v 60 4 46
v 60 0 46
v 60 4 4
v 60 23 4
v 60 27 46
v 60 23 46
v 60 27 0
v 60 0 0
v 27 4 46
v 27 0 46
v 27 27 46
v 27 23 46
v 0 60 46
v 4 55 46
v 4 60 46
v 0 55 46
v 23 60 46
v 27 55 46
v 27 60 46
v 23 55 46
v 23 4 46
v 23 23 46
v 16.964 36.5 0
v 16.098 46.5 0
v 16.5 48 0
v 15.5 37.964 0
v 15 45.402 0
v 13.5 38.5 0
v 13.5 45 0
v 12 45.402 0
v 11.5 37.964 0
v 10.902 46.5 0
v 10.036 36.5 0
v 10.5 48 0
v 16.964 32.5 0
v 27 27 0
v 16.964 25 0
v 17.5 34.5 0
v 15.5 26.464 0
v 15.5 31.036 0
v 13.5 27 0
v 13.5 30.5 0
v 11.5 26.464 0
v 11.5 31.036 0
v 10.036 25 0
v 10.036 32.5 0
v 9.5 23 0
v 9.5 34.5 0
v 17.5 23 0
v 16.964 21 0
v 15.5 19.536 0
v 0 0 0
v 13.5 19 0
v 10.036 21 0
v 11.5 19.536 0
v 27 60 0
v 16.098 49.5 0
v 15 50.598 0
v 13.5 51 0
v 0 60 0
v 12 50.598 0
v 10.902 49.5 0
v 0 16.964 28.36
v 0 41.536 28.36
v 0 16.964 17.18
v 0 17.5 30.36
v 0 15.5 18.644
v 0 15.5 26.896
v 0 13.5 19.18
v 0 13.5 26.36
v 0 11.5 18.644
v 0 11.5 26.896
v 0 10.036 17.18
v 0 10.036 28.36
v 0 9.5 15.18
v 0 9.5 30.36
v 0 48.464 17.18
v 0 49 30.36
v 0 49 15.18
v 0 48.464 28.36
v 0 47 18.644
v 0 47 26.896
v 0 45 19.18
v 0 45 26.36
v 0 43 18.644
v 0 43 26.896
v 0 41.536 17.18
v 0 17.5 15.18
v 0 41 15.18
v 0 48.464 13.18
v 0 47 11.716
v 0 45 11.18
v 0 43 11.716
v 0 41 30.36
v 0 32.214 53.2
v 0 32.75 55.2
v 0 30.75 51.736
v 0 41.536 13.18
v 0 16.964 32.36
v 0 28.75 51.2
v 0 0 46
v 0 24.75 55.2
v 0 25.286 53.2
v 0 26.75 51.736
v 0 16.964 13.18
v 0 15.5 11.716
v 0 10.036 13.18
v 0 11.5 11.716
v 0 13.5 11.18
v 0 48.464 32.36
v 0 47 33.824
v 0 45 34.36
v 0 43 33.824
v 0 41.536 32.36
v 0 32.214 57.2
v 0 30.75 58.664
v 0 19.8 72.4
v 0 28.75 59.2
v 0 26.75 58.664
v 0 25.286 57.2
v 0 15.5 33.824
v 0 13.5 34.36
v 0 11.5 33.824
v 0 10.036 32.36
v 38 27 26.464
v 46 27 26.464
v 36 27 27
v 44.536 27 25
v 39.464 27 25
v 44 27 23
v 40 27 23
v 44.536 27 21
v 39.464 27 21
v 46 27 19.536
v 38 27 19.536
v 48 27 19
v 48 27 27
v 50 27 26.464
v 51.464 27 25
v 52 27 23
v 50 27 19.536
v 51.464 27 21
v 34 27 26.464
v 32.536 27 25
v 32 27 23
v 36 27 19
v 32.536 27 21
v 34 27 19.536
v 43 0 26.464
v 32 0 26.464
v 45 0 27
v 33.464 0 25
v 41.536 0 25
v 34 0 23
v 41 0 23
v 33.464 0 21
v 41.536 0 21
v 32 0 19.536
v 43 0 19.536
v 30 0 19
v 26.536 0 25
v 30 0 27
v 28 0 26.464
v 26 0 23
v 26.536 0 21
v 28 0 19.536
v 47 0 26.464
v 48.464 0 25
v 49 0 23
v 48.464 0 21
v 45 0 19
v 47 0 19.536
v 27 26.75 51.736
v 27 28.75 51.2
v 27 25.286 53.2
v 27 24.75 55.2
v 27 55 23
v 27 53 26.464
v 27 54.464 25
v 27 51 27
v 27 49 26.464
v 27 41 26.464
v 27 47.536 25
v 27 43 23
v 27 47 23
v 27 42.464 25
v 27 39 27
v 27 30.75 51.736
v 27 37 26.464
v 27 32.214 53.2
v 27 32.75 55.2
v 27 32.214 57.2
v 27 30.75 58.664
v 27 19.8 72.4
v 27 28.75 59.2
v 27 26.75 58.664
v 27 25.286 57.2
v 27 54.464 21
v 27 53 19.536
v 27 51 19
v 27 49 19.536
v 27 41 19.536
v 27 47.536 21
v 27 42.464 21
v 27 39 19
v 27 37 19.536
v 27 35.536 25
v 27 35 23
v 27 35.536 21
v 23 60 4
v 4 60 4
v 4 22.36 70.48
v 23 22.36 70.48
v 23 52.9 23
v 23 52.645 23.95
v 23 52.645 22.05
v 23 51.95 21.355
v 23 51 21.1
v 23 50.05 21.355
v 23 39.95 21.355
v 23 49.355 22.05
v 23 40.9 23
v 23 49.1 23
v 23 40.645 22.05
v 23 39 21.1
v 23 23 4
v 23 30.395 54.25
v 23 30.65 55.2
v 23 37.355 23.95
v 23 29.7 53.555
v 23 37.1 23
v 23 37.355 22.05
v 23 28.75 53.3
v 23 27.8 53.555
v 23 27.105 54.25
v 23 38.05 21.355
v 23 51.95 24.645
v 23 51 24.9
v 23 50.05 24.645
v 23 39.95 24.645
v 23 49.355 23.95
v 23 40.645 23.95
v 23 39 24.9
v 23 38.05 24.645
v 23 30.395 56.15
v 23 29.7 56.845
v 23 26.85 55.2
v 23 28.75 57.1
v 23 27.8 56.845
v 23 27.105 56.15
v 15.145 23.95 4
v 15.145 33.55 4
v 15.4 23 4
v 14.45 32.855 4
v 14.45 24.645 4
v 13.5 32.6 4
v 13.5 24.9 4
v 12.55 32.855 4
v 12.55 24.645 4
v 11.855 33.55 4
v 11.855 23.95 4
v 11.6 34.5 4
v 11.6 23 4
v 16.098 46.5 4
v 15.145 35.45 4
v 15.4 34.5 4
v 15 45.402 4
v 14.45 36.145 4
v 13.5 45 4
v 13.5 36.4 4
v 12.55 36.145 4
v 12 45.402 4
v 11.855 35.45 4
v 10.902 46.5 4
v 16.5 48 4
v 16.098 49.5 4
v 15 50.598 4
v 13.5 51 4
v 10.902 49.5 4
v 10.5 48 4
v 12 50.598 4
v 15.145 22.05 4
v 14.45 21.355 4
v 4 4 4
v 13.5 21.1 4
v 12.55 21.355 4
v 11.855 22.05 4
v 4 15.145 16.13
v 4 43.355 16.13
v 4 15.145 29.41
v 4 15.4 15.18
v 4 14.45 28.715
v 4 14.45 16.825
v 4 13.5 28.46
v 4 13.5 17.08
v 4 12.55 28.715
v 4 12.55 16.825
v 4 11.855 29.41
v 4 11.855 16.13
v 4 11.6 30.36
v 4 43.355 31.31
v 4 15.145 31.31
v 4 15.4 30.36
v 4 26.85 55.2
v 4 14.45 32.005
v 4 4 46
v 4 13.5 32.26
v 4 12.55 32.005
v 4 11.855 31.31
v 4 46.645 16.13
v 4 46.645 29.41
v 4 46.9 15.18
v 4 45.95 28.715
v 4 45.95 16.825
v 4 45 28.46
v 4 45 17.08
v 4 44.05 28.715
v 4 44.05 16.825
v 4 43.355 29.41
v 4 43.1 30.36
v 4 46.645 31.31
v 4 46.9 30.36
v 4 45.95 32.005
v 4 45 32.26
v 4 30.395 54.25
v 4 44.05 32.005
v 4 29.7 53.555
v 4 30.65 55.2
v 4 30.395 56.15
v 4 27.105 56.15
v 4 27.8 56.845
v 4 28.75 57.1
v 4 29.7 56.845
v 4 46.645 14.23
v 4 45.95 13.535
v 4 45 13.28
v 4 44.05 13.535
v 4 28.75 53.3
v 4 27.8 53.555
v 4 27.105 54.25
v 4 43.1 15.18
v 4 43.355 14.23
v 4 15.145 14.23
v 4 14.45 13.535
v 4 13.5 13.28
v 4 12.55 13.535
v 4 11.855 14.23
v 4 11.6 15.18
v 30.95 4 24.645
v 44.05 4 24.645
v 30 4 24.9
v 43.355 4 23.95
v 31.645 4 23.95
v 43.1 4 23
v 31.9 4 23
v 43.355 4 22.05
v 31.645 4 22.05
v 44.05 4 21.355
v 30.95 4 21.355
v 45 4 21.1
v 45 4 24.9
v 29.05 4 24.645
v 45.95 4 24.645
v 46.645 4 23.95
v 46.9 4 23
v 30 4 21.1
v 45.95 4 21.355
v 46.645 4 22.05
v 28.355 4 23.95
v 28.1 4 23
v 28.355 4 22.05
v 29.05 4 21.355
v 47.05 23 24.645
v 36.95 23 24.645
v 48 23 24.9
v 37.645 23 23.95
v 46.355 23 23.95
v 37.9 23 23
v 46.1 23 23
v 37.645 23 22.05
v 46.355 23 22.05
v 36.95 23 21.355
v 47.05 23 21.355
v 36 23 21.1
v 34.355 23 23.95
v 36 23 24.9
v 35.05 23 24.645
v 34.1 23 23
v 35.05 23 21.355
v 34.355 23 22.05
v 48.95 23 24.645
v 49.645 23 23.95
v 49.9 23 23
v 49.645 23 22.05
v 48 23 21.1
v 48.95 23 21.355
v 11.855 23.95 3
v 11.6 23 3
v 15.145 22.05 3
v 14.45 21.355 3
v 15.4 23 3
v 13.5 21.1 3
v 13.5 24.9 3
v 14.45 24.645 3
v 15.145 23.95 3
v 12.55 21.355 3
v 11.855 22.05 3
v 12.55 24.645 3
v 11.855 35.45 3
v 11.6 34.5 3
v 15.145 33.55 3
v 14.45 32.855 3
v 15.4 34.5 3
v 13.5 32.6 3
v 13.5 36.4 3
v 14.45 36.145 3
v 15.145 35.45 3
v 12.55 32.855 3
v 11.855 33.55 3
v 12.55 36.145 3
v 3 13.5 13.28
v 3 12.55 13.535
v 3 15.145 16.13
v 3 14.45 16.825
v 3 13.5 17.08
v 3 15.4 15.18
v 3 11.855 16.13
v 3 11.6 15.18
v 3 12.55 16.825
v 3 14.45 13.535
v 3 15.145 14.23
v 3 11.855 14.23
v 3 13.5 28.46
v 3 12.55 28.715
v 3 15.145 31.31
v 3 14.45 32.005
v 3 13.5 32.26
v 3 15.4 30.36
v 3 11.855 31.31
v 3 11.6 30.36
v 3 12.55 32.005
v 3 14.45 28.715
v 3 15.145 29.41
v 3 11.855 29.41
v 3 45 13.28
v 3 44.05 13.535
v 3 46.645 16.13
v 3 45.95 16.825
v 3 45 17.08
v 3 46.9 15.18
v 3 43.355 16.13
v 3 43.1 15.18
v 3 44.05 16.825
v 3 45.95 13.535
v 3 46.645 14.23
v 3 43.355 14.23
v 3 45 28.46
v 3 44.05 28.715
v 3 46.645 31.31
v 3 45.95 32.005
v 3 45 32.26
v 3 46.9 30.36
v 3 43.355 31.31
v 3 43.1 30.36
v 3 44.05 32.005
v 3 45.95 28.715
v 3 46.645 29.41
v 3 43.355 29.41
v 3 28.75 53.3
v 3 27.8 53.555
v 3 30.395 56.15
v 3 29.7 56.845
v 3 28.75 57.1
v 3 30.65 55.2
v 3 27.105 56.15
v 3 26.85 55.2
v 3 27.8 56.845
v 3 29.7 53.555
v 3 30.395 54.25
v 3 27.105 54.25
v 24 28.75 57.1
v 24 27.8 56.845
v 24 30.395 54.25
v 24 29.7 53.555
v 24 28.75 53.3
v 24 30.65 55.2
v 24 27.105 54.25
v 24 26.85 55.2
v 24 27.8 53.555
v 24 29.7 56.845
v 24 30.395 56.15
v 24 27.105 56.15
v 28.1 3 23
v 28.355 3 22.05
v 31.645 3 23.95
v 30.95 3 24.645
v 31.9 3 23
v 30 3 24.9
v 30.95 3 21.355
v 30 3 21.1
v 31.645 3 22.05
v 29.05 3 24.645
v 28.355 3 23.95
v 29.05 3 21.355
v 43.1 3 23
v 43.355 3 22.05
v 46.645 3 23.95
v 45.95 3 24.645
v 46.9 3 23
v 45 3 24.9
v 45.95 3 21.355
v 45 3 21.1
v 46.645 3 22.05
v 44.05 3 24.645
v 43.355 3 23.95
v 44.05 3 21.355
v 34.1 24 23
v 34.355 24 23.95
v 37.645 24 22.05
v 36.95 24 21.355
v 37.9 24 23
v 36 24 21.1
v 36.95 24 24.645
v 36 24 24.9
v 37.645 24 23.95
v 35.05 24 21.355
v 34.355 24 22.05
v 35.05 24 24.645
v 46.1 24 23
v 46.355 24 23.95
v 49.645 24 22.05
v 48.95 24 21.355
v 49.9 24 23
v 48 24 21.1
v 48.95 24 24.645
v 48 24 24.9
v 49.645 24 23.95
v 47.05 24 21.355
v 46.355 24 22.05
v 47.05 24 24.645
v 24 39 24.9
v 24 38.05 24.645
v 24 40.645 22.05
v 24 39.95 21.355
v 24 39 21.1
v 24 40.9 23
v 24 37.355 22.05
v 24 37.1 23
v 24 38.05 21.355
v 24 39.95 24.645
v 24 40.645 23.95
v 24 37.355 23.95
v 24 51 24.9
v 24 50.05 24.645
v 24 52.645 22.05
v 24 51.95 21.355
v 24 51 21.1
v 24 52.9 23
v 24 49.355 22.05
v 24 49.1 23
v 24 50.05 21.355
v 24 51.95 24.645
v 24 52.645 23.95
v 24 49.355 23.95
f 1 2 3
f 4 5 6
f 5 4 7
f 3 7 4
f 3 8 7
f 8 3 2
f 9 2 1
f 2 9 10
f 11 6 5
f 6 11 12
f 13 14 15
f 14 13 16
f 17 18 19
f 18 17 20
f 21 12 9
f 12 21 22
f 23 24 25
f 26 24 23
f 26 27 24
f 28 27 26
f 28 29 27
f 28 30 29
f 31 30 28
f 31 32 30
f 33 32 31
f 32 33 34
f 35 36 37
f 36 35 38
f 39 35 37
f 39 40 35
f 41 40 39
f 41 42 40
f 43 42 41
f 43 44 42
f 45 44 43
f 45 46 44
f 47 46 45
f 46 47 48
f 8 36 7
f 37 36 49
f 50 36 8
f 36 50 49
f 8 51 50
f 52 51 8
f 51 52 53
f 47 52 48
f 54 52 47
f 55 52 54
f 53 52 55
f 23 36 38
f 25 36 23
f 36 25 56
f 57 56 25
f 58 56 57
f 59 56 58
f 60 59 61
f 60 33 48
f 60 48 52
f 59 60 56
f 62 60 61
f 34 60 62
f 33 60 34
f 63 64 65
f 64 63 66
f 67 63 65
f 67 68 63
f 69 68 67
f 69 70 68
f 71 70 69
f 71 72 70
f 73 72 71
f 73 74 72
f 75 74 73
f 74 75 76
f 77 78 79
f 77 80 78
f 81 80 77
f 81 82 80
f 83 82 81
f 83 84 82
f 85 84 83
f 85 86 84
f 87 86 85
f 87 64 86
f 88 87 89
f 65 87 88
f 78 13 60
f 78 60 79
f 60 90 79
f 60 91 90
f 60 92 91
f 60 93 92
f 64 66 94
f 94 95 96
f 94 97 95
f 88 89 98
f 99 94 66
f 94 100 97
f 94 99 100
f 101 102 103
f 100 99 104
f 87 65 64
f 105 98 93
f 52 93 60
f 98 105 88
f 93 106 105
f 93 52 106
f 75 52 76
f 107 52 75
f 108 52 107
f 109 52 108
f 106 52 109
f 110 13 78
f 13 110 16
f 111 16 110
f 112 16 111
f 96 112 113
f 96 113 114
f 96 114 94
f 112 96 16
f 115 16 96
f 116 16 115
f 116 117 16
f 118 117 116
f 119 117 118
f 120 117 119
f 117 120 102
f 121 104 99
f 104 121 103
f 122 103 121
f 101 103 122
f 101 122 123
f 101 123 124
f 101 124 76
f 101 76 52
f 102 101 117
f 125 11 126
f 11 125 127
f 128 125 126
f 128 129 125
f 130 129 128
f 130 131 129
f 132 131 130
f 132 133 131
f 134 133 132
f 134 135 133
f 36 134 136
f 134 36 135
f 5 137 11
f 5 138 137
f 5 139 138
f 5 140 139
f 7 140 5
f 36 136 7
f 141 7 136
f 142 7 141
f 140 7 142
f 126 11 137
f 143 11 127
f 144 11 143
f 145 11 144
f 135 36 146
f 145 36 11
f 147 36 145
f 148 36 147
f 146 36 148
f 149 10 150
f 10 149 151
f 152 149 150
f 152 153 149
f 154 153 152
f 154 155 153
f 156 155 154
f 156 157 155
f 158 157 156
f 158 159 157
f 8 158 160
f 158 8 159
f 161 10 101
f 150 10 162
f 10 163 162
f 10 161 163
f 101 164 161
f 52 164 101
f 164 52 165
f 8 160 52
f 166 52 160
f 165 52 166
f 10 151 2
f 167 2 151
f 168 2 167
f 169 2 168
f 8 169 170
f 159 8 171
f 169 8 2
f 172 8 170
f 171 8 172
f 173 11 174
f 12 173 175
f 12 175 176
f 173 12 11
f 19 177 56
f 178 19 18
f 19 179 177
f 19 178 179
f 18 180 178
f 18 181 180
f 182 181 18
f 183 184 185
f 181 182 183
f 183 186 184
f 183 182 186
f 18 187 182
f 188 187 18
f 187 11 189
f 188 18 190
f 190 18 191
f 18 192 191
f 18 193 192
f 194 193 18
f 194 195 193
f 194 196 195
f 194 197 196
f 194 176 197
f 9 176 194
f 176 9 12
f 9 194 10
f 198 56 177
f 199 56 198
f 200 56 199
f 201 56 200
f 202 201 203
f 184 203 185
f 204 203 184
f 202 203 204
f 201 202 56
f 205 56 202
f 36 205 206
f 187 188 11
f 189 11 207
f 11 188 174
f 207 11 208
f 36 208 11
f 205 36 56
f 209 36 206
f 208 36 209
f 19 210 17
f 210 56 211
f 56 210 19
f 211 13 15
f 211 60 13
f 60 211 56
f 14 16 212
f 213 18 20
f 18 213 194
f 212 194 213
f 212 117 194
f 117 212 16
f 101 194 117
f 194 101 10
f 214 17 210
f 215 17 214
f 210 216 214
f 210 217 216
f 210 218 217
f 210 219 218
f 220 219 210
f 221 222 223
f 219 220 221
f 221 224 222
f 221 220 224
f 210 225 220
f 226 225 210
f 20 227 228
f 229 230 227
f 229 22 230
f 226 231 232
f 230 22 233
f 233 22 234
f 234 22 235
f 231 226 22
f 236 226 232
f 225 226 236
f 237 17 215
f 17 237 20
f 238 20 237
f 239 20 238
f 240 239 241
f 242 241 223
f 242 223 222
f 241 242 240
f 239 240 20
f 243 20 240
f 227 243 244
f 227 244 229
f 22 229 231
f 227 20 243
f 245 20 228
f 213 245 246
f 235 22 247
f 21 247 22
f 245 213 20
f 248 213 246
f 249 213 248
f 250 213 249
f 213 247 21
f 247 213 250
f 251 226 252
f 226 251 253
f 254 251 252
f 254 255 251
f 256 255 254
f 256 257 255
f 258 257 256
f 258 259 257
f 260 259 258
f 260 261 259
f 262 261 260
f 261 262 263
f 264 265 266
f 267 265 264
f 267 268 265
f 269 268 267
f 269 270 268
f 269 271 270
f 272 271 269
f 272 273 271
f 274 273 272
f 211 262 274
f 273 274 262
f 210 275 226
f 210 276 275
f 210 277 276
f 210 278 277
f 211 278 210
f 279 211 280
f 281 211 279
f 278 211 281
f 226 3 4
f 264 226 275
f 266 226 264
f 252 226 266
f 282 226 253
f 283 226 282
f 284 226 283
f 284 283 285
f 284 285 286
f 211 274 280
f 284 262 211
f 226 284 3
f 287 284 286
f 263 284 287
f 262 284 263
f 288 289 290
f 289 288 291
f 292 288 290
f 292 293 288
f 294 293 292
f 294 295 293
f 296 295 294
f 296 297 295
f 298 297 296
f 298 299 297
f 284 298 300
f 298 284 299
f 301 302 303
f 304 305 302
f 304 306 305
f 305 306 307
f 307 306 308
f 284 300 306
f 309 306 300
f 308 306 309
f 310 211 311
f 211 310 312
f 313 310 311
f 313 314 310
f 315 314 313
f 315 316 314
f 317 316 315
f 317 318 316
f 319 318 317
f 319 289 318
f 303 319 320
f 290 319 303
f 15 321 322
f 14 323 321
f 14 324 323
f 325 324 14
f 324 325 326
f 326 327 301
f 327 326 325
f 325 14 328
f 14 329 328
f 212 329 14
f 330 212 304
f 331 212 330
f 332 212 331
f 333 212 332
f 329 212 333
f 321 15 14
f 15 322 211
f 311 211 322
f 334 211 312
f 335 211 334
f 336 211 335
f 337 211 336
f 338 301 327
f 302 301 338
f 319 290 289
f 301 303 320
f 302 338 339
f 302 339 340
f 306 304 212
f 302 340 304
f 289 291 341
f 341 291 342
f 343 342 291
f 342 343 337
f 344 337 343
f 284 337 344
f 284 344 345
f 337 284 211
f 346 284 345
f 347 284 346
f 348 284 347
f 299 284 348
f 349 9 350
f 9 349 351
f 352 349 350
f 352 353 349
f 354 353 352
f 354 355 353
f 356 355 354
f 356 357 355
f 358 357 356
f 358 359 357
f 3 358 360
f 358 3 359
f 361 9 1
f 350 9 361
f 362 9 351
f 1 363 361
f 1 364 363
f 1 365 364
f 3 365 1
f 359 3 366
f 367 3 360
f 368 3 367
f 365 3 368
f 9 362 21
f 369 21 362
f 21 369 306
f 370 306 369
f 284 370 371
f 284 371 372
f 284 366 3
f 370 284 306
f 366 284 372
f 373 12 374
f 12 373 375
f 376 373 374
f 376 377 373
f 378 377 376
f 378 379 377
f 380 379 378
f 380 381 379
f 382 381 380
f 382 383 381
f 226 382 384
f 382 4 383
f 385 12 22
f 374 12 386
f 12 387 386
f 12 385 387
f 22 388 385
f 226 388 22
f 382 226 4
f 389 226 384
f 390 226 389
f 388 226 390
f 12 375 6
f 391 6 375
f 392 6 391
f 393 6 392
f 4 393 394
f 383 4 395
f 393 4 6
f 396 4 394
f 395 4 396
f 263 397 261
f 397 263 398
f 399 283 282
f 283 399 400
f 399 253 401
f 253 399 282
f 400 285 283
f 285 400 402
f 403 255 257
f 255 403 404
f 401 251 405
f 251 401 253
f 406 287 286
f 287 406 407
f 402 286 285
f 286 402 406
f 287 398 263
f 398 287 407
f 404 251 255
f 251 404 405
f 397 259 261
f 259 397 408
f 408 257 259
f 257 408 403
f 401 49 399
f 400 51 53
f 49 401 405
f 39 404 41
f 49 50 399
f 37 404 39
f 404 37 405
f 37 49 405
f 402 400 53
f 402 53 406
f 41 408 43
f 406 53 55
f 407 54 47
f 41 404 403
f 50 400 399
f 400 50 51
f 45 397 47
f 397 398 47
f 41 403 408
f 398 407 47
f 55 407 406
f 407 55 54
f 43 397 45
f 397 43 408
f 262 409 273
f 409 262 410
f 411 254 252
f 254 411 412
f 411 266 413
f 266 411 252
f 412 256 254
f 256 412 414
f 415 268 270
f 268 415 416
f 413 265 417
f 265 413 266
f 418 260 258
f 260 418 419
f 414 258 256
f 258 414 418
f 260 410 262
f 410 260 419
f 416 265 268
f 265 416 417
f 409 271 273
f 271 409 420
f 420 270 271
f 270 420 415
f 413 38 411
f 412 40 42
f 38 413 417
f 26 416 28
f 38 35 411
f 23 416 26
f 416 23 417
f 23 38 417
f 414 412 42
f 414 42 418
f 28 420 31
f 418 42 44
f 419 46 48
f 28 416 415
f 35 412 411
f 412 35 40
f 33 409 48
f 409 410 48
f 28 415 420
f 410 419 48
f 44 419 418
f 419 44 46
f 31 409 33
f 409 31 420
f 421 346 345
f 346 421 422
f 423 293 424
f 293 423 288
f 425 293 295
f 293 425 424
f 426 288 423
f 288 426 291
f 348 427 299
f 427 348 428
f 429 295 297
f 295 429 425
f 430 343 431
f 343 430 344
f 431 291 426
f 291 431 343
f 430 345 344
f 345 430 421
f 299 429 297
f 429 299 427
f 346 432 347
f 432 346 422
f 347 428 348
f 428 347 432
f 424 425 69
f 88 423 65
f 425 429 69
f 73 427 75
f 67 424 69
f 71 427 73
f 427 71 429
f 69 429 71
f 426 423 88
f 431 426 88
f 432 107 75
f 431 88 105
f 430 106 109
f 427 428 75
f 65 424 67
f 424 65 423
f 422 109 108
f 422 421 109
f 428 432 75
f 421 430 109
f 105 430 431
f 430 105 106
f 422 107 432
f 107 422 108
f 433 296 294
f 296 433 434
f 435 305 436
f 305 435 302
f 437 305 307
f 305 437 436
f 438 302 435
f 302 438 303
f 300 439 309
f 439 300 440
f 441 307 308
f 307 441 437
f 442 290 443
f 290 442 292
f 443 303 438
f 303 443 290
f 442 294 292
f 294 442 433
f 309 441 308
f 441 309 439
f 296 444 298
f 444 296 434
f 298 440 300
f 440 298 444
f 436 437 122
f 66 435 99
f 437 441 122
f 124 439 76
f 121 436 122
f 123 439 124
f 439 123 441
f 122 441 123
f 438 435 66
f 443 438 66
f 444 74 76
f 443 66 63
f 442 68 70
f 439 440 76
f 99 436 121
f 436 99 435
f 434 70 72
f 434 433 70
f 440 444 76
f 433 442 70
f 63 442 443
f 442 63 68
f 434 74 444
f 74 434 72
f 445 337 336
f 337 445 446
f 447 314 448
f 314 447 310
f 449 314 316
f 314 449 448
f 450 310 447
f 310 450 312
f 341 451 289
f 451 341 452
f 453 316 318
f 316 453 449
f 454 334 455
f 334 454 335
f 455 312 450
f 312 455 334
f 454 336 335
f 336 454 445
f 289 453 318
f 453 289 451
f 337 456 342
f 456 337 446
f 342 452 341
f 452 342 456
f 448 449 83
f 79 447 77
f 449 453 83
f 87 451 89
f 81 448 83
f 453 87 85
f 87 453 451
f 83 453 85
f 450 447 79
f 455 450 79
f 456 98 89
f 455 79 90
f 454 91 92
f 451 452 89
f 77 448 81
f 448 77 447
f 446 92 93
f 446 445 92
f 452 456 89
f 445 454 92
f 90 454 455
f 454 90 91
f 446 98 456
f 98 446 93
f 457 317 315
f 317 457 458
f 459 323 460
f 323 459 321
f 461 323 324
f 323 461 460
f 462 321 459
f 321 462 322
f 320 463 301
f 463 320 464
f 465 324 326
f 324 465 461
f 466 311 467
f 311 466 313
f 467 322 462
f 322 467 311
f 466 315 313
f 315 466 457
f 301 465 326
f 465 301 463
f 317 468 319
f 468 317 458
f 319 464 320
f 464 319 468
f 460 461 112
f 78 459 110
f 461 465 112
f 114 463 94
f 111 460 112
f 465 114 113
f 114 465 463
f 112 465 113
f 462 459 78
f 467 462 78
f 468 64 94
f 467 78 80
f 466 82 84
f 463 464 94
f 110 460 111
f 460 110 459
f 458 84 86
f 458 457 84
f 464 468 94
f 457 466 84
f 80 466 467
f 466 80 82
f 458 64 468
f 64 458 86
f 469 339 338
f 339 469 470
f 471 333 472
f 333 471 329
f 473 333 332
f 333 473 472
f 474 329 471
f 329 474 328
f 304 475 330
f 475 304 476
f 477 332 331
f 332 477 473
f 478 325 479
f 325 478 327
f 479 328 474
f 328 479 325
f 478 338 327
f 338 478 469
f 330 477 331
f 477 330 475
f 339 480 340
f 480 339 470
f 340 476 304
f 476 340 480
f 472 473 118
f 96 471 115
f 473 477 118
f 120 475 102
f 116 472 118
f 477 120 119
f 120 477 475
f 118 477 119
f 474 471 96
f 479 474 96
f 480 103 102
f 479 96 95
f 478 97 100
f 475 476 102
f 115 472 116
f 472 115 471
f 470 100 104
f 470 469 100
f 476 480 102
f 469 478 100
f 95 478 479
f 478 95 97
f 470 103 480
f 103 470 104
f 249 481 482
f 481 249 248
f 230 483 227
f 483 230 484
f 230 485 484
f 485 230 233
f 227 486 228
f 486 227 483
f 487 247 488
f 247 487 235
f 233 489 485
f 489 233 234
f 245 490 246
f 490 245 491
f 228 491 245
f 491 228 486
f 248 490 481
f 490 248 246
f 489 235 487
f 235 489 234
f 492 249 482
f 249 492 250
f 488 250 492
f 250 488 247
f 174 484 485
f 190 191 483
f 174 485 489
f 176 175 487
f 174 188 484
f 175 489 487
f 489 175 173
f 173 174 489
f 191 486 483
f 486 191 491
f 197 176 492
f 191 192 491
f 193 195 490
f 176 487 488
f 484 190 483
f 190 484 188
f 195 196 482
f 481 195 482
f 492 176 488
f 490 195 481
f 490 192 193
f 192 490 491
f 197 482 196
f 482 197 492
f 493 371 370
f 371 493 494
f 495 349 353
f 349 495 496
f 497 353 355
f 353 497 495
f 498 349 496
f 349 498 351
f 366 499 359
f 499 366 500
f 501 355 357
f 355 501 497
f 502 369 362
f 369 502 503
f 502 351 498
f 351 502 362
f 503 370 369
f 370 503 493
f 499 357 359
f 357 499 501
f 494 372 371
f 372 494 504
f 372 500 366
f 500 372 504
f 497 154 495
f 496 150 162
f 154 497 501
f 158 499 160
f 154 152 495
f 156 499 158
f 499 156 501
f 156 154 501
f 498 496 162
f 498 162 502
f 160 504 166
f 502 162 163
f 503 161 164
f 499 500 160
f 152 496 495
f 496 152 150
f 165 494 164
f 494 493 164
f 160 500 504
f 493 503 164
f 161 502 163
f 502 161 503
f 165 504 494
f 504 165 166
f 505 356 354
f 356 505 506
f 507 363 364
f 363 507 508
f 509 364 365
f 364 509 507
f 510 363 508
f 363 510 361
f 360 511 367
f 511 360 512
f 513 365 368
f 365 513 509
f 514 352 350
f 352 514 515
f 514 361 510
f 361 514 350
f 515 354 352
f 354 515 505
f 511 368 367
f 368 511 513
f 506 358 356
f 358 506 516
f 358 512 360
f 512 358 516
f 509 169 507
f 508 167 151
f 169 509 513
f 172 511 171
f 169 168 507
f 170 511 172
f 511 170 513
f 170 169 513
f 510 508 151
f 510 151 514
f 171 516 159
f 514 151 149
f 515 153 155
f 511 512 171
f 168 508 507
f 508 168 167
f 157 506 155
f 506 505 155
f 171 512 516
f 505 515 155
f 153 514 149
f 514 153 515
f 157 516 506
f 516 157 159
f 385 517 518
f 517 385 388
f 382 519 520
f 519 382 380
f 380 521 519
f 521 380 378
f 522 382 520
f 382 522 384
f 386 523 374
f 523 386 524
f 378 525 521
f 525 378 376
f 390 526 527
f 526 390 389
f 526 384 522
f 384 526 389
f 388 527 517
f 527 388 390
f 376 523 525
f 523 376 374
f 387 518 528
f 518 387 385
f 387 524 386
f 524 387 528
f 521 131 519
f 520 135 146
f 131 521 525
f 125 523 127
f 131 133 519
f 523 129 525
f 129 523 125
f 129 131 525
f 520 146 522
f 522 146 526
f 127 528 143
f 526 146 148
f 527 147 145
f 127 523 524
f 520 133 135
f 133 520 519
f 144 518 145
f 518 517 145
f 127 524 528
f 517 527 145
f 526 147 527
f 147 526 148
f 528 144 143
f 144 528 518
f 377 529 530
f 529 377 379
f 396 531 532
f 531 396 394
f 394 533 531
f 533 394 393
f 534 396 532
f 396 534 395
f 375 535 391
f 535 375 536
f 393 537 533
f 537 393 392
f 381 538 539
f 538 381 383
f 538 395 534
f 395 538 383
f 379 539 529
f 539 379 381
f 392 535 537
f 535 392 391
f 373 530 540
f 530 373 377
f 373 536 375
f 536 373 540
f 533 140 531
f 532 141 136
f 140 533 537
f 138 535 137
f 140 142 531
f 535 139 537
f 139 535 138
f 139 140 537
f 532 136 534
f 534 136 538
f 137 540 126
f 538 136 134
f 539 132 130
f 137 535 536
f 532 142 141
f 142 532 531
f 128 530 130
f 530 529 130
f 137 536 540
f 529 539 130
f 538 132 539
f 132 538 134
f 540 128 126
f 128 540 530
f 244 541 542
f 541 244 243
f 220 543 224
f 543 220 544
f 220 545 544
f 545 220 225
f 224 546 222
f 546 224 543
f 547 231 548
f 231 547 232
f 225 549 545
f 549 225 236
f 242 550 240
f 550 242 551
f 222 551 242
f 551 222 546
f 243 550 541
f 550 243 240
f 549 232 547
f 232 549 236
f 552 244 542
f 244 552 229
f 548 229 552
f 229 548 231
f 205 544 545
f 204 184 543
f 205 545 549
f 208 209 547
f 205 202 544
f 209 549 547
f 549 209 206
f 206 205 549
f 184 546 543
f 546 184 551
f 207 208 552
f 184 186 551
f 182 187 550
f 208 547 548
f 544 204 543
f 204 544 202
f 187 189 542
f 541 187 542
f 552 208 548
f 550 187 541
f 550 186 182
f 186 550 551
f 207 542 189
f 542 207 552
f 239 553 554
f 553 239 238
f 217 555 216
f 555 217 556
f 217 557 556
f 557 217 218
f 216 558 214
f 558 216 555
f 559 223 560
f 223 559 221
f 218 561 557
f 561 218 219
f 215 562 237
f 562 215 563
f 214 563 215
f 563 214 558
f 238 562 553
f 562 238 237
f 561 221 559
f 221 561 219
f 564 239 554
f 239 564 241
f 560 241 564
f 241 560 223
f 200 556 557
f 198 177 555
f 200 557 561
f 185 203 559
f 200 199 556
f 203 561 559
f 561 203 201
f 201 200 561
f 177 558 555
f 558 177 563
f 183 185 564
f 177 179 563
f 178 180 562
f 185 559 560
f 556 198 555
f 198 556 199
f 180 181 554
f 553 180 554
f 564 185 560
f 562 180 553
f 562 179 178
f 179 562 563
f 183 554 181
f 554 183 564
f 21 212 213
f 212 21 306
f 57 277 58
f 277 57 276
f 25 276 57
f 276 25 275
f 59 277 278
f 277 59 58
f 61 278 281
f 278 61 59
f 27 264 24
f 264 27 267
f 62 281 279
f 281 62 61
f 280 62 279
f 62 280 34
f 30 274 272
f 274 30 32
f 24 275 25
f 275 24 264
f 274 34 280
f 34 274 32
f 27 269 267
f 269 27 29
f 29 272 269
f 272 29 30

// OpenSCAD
difference(){
	union() {
		cube(size = [60, 27, 46]);
		cube(size = [27, 60, 46]);
		translate(v = [0, 0, 46]) {
			rotate(a = -36.8700000000, v = [1, 0, 0]) {
				translate(v = [0, 0, 0]) {
					cube(size = [27, 46, 33]);
				}
			}
		}
		translate(v = [13.5000000000, 23.0000000000, 0]) {
			rotate(a = 180, v = [1, 0, 0]) {
			}
		}
		translate(v = [13.5000000000, 34.5000000000, 0]) {
			rotate(a = 180, v = [1, 0, 0]) {
			}
		}
		translate(v = [0, 13.5000000000, 15.1800000000]) {
			rotate(a = -90, v = [0, 1, 0]) {
			}
		}
		translate(v = [0, 13.5000000000, 30.3600000000]) {
			rotate(a = -90, v = [0, 1, 0]) {
			}
		}
		translate(v = [0, 45.0000000000, 15.1800000000]) {
			rotate(a = -90, v = [0, 1, 0]) {
			}
		}
		translate(v = [0, 45.0000000000, 30.3600000000]) {
			rotate(a = -90, v = [0, 1, 0]) {
			}
		}
		translate(v = [0, 28.7500000000, 55.2000000000]) {
			rotate(a = -90, v = [0, 1, 0]) {
			}
		}
		translate(v = [27, 28.7500000000, 55.2000000000]) {
			rotate(a = 90, v = [0, 1, 0]) {
			}
		}
		translate(v = [30.0000000000, 0, 23.0000000000]) {
			rotate(a = 90, v = [1, 0, 0]) {
			}
		}
		translate(v = [45.0000000000, 0, 23.0000000000]) {
			rotate(a = 90, v = [1, 0, 0]) {
			}
		}
		translate(v = [36.0000000000, 27, 23.0000000000]) {
			rotate(a = -90, v = [1, 0, 0]) {
			}
		}
		translate(v = [48.0000000000, 27, 23.0000000000]) {
			rotate(a = -90, v = [1, 0, 0]) {
			}
		}
		translate(v = [27, 39.0000000000, 23.0000000000]) {
			rotate(a = 90, v = [0, 1, 0]) {
			}
		}
		translate(v = [27, 51.0000000000, 23.0000000000]) {
			rotate(a = 90, v = [0, 1, 0]) {
			}
		}
		translate(v = [13.5000000000, 48.0000000000, -1]) {
		}
	}
	/* Holes Below*/
	union(){
		translate(v = [4, 4, 4]) {
			cube(size = [19, 60, 42]);
			cube(size = [60, 19, 42]);
		}
		translate(v = [4, 4, 46]) {
			rotate(a = -36.8700000000, v = [1, 0, 0]) {
				translate(v = [0, 0, 0]) {
					cube(size = [19, 60, 38]);
				}
			}
		}
		translate(v = [13.5000000000, 23.0000000000, 0]){
			rotate(a = 180, v = [1, 0, 0]){
				union() {
					union() {
						translate(v = [0, 0, -5]) {
							cylinder($fn = 12, h = 5, r = 1.9000000000);
						}
						translate(v = [0, 0, -3]) {
							cylinder($fn = 12, h = 3, r1 = 1.9000000000, r2 = 4);
						}
					}
					cylinder($fn = 12, h = 1, r = 4);
				}
			}
		}
		translate(v = [13.5000000000, 34.5000000000, 0]){
			rotate(a = 180, v = [1, 0, 0]){
				union() {
					union() {
						translate(v = [0, 0, -5]) {
							cylinder($fn = 12, h = 5, r = 1.9000000000);
						}
						translate(v = [0, 0, -3]) {
							cylinder($fn = 12, h = 3, r1 = 1.9000000000, r2 = 4);
						}
					}
					cylinder($fn = 12, h = 1, r = 4);
				}
			}
		}
		translate(v = [0, 13.5000000000, 15.1800000000]){
			rotate(a = -90, v = [0, 1, 0]){
				union() {
					union() {
						translate(v = [0, 0, -5]) {
							cylinder($fn = 12, h = 5, r = 1.9000000000);
						}
						translate(v = [0, 0, -3]) {
							cylinder($fn = 12, h = 3, r1 = 1.9000000000, r2 = 4);
						}
					}
					cylinder($fn = 12, h = 1, r = 4);
				}
			}
		}
		translate(v = [0, 13.5000000000, 30.3600000000]){
			rotate(a = -90, v = [0, 1, 0]){
				union() {
					union() {
						translate(v = [0, 0, -5]) {
							cylinder($fn = 12, h = 5, r = 1.9000000000);
						}
						translate(v = [0, 0, -3]) {
							cylinder($fn = 12, h = 3, r1 = 1.9000000000, r2 = 4);
						}
					}
					cylinder($fn = 12, h = 1, r = 4);
				}
			}
		}
		translate(v = [0, 45.0000000000, 15.1800000000]){
			rotate(a = -90, v = [0, 1, 0]){
				union() {
					union() {
						translate(v = [0, 0, -5]) {
							cylinder($fn = 12, h = 5, r = 1.9000000000);
						}
						translate(v = [0, 0, -3]) {
							cylinder($fn = 12, h = 3, r1 = 1.9000000000, r2 = 4);
						}
					}
					cylinder($fn = 12, h = 1, r = 4);
				}
			}
		}
		translate(v = [0, 45.0000000000, 30.3600000000]){
			rotate(a = -90, v = [0, 1, 0]){
				union() {
					union() {
						translate(v = [0, 0, -5]) {
							cylinder($fn = 12, h = 5, r = 1.9000000000);
						}
						translate(v = [0, 0, -3]) {
							cylinder($fn = 12, h = 3, r1 = 1.9000000000, r2 = 4);
						}
					}
					cylinder($fn = 12, h = 1, r = 4);
				}
			}
		}
		translate(v = [0, 28.7500000000, 55.2000000000]){
			rotate(a = -90, v = [0, 1, 0]){
				union() {
					union() {
						translate(v = [0, 0, -5]) {
							cylinder($fn = 12, h = 5, r = 1.9000000000);
						}
						translate(v = [0, 0, -3]) {
							cylinder($fn = 12, h = 3, r1 = 1.9000000000, r2 = 4);
						}
					}
					cylinder($fn = 12, h = 1, r = 4);
				}
			}
		}
		translate(v = [27, 28.7500000000, 55.2000000000]){
			rotate(a = 90, v = [0, 1, 0]){
				union() {
					union() {
						translate(v = [0, 0, -5]) {
							cylinder($fn = 12, h = 5, r = 1.9000000000);
						}
						translate(v = [0, 0, -3]) {
							cylinder($fn = 12, h = 3, r1 = 1.9000000000, r2 = 4);
						}
					}
					cylinder($fn = 12, h = 1, r = 4);
				}
			}
		}
		translate(v = [30.0000000000, 0, 23.0000000000]){
			rotate(a = 90, v = [1, 0, 0]){
				union() {
					union() {
						translate(v = [0, 0, -5]) {
							cylinder($fn = 12, h = 5, r = 1.9000000000);
						}
						translate(v = [0, 0, -3]) {
							cylinder($fn = 12, h = 3, r1 = 1.9000000000, r2 = 4);
						}
					}
					cylinder($fn = 12, h = 1, r = 4);
				}
			}
		}
		translate(v = [45.0000000000, 0, 23.0000000000]){
			rotate(a = 90, v = [1, 0, 0]){
				union() {
					union() {
						translate(v = [0, 0, -5]) {
							cylinder($fn = 12, h = 5, r = 1.9000000000);
						}
						translate(v = [0, 0, -3]) {
							cylinder($fn = 12, h = 3, r1 = 1.9000000000, r2 = 4);
						}
					}
					cylinder($fn = 12, h = 1, r = 4);
				}
			}
		}
		translate(v = [36.0000000000, 27, 23.0000000000]){
			rotate(a = -90, v = [1, 0, 0]){
				union() {
					union() {
						translate(v = [0, 0, -5]) {
							cylinder($fn = 12, h = 5, r = 1.9000000000);
						}
						translate(v = [0, 0, -3]) {
							cylinder($fn = 12, h = 3, r1 = 1.9000000000, r2 = 4);
						}
					}
					cylinder($fn = 12, h = 1, r = 4);
				}
			}
		}
		translate(v = [48.0000000000, 27, 23.0000000000]){
			rotate(a = -90, v = [1, 0, 0]){
				union() {
					union() {
						translate(v = [0, 0, -5]) {
							cylinder($fn = 12, h = 5, r = 1.9000000000);
						}
						translate(v = [0, 0, -3]) {
							cylinder($fn = 12, h = 3, r1 = 1.9000000000, r2 = 4);
						}
					}
					cylinder($fn = 12, h = 1, r = 4);
				}
			}
		}
		translate(v = [27, 39.0000000000, 23.0000000000]){
			rotate(a = 90, v = [0, 1, 0]){
				union() {
					union() {
						translate(v = [0, 0, -5]) {
							cylinder($fn = 12, h = 5, r = 1.9000000000);
						}
						translate(v = [0, 0, -3]) {
							cylinder($fn = 12, h = 3, r1 = 1.9000000000, r2 = 4);
						}
					}
					cylinder($fn = 12, h = 1, r = 4);
				}
			}
		}
		translate(v = [27, 51.0000000000, 23.0000000000]){
			rotate(a = 90, v = [0, 1, 0]){
				union() {
					union() {
						translate(v = [0, 0, -5]) {
							cylinder($fn = 12, h = 5, r = 1.9000000000);
						}
						translate(v = [0, 0, -3]) {
							cylinder($fn = 12, h = 3, r1 = 1.9000000000, r2 = 4);
						}
					}
					cylinder($fn = 12, h = 1, r = 4);
				}
			}
		}
		translate(v = [13.5000000000, 48.0000000000, -1]){
			cylinder($fn = 12, h = 6, r = 3);
		}
	} /* End Holes */ 
}
